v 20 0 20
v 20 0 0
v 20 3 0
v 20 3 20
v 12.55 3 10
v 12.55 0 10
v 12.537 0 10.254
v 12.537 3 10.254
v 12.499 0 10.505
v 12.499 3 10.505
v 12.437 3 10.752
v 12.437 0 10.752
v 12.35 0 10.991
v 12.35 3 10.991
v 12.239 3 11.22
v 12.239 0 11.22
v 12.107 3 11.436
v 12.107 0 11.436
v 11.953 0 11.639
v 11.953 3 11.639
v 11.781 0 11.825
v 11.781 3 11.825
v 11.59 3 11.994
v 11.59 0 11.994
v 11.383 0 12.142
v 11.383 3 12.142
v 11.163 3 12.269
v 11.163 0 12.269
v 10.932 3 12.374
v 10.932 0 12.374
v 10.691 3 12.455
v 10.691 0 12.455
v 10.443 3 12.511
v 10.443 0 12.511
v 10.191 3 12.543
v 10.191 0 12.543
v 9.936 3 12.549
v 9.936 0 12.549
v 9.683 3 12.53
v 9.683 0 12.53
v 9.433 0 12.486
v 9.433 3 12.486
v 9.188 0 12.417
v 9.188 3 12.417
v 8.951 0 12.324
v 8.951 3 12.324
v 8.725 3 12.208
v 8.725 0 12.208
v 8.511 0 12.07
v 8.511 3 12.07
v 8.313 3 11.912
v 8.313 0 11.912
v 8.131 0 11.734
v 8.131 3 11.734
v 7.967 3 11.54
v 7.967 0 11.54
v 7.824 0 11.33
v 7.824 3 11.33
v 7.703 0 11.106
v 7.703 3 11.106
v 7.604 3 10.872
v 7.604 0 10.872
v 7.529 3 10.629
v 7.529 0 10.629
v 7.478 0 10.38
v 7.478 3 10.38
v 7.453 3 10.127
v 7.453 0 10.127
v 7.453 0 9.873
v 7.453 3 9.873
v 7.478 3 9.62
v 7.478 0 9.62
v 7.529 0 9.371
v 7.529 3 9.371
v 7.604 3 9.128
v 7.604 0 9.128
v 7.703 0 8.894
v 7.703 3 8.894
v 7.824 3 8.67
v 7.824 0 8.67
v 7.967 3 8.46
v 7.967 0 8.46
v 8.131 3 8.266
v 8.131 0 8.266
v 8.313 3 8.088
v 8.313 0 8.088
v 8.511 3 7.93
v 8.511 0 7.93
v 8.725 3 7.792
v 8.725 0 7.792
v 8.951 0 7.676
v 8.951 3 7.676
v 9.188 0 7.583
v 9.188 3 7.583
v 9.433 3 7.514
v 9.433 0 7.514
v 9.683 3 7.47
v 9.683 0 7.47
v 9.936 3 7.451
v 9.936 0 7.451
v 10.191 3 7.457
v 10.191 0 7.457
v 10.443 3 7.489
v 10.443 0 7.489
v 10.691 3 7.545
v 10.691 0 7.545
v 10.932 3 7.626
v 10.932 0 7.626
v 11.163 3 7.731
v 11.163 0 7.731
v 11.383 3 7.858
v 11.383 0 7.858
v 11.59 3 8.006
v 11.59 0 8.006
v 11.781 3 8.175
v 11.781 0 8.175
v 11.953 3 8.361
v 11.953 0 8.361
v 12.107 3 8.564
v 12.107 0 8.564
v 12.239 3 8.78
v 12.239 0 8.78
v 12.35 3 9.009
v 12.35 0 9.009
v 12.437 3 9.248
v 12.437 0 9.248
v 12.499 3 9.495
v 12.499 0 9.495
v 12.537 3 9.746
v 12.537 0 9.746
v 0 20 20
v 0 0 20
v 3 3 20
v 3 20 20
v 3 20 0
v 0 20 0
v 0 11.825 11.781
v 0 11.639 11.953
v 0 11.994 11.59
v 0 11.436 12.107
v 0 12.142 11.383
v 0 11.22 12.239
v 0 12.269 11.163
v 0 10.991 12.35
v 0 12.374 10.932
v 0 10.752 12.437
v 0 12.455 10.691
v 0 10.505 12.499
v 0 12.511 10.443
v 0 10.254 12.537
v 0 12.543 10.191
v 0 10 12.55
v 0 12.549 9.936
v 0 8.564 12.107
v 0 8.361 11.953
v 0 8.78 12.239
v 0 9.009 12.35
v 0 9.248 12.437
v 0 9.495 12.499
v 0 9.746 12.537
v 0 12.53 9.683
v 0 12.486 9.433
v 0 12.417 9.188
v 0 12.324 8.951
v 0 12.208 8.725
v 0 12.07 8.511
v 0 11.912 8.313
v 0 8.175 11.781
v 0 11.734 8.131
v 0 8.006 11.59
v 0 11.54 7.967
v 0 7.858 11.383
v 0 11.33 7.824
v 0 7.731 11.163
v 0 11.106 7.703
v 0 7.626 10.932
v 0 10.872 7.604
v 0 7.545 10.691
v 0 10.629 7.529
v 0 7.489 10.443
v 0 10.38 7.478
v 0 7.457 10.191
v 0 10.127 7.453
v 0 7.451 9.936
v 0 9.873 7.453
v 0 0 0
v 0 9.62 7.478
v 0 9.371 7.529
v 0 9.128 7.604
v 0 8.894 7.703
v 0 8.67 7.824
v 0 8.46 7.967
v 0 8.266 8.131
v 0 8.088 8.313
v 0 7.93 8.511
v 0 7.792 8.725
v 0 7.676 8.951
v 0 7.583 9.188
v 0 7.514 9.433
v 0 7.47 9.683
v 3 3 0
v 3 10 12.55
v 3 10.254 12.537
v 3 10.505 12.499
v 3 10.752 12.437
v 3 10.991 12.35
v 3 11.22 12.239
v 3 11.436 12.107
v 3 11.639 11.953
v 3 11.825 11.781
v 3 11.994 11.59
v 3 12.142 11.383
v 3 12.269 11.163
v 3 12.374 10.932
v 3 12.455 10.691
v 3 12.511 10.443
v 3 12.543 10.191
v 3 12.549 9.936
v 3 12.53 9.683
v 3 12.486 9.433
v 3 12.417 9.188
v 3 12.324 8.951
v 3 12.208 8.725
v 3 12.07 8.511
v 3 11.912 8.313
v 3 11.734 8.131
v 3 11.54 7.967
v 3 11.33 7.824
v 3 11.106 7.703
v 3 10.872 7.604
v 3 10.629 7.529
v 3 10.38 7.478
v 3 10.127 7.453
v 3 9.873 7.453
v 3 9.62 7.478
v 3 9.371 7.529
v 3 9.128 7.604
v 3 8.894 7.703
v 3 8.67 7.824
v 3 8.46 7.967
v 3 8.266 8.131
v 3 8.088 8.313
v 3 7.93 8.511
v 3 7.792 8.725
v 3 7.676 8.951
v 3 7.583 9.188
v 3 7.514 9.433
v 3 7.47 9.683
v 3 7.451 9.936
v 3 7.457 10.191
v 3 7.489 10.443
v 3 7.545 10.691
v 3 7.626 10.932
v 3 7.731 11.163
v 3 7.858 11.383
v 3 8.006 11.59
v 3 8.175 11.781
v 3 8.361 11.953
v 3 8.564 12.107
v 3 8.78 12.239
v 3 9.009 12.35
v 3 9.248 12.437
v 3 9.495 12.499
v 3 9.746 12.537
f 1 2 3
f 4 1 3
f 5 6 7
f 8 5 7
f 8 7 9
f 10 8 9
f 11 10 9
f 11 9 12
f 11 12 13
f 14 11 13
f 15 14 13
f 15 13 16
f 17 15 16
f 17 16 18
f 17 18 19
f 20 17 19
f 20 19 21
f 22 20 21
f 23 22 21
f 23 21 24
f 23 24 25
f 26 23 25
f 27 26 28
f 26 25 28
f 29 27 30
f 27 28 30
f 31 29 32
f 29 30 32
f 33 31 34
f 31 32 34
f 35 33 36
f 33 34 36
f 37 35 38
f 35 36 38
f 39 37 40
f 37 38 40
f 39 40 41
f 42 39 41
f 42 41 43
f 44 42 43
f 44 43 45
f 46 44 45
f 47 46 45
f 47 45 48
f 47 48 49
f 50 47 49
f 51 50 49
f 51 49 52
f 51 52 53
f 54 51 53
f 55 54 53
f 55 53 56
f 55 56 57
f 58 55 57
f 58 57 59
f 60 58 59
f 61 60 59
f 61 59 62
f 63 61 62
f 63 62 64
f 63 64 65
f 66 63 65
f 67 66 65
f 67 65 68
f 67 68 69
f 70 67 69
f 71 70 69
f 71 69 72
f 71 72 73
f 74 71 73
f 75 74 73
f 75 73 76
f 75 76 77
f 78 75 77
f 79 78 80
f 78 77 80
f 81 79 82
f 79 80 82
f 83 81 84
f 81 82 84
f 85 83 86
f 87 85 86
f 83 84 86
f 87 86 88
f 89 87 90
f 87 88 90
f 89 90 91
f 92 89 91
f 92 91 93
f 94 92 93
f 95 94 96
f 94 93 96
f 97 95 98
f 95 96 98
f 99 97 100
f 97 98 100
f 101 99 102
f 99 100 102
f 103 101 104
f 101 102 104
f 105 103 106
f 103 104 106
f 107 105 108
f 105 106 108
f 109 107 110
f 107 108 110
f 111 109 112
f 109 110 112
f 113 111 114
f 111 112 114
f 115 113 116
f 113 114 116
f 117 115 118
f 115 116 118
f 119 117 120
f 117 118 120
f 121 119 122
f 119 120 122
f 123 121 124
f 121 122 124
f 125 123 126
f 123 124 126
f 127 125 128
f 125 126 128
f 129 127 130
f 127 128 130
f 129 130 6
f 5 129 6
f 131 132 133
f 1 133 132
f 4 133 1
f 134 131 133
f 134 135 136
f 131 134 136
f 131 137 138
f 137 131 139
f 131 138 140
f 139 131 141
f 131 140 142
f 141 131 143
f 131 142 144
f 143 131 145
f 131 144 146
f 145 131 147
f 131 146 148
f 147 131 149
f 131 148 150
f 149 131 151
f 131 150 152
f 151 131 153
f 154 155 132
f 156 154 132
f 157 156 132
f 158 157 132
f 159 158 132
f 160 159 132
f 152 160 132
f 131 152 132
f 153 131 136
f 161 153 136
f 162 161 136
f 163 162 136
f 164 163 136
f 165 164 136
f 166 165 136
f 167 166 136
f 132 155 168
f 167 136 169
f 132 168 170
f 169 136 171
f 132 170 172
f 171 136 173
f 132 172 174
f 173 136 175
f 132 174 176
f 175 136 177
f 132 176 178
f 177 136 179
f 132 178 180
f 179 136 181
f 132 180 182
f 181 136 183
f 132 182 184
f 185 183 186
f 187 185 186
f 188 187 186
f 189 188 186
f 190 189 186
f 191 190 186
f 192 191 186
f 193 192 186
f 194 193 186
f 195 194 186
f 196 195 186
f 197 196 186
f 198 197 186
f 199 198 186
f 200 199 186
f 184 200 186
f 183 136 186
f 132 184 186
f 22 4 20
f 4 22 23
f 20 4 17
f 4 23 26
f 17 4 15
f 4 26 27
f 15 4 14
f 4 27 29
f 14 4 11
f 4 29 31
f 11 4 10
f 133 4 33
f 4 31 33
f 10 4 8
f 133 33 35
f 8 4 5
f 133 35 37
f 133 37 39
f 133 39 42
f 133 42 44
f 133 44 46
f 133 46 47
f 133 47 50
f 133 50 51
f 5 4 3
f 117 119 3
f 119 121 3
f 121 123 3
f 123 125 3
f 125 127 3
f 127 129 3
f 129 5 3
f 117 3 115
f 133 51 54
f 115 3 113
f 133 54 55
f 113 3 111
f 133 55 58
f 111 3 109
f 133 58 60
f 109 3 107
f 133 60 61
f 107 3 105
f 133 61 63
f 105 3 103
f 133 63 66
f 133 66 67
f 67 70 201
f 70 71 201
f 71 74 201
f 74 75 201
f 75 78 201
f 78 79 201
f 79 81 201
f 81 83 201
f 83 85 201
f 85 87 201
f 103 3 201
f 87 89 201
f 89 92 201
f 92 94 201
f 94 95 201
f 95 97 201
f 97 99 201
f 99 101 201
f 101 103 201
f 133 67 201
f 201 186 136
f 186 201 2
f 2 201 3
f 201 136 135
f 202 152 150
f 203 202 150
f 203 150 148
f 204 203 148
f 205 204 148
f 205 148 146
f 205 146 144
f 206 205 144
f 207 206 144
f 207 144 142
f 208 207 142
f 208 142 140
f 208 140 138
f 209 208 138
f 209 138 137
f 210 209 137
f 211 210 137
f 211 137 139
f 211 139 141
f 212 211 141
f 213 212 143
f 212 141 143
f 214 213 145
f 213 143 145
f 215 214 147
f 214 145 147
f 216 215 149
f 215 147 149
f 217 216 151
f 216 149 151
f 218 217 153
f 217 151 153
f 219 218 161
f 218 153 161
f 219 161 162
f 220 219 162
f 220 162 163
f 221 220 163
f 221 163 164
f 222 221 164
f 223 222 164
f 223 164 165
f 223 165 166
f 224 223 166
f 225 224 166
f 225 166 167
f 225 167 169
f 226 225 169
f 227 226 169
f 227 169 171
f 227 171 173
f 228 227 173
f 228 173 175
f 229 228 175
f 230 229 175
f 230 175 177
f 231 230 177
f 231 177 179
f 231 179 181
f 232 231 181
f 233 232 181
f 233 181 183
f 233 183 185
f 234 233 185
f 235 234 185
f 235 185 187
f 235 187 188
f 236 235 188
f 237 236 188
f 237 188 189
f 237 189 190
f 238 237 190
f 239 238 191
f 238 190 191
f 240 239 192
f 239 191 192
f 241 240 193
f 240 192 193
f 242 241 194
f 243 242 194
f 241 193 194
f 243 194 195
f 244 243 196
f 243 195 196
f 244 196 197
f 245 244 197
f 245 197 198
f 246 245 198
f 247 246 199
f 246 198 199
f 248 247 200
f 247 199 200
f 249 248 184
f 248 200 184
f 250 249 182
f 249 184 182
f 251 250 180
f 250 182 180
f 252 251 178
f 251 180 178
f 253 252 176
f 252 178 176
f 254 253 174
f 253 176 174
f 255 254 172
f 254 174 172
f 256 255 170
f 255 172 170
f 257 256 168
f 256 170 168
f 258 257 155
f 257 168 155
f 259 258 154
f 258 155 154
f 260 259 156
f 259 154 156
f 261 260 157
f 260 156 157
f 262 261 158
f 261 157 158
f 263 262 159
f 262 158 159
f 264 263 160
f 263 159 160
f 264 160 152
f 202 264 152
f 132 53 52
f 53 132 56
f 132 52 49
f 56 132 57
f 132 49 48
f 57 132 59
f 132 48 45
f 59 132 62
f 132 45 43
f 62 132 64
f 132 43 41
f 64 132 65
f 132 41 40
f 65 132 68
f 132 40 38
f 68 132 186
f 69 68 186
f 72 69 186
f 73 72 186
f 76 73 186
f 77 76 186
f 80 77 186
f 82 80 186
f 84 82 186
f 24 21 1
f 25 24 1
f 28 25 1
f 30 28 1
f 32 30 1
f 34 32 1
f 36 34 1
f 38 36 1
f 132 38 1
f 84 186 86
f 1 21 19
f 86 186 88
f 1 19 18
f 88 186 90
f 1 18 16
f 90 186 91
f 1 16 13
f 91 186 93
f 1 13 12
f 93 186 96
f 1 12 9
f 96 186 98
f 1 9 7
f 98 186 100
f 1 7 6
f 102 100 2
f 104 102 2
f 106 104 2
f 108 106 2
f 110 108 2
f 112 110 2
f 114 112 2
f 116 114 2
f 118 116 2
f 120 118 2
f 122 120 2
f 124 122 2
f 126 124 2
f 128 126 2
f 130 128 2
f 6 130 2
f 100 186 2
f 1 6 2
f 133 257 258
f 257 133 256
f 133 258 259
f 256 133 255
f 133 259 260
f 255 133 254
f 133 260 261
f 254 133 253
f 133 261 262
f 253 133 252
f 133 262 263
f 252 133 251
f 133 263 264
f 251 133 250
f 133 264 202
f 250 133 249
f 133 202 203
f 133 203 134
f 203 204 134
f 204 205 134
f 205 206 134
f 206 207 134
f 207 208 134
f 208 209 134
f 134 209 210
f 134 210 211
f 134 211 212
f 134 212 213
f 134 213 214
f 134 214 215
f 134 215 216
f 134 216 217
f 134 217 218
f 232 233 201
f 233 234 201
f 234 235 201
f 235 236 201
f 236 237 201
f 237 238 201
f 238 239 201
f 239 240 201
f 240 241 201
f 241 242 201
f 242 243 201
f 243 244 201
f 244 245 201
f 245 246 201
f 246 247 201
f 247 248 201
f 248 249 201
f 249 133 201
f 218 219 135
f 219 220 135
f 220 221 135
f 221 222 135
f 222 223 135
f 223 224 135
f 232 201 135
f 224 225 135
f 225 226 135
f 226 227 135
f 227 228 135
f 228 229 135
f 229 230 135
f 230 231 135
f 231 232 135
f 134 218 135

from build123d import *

# Parameters (mm, degrees)
BOSS_EXTRUDE1_DEPTH = 20
CUT_EXTRUDE1_REACH  = 22
SKETCH2_R           = 2.55
CUT_EXTRUDE2_REACH  = 22
SKETCH3_R           = 2.55


with BuildPart() as part:
    # Sketch1 → Boss-Extrude1 (new body)
    with BuildSketch(Plane.XY):
        Polygon((0, 20), (0, 0), (20, 0), (20, 3), (3, 3), (3, 20), align=None)
    extrude(amount=BOSS_EXTRUDE1_DEPTH)

    # Sketch2 → Cut-Extrude1 (cut, up to next)
    with BuildSketch(Plane.ZY, mode=Mode.PRIVATE) as cut_extrude1_sk1:
        with Locations((10, 10)):
            Circle(SKETCH2_R)
    cut_extrude1_tool1 = extrude(cut_extrude1_sk1.sketch, amount=-CUT_EXTRUDE1_REACH, mode=Mode.PRIVATE) & part.part
    add(cut_extrude1_tool1.solids().sort_by_distance((0, 10, 10))[0], mode=Mode.SUBTRACT)

    # Sketch3 → Cut-Extrude2 (cut, up to next)
    with BuildSketch(Plane.XZ, mode=Mode.PRIVATE) as cut_extrude2_sk1:
        with Locations((10, 10)):
            Circle(SKETCH3_R)
    cut_extrude2_tool1 = extrude(cut_extrude2_sk1.sketch, amount=-CUT_EXTRUDE2_REACH, mode=Mode.PRIVATE) & part.part
    add(cut_extrude2_tool1.solids().sort_by_distance((10, 0, 10))[0], mode=Mode.SUBTRACT)


solid = part.part
